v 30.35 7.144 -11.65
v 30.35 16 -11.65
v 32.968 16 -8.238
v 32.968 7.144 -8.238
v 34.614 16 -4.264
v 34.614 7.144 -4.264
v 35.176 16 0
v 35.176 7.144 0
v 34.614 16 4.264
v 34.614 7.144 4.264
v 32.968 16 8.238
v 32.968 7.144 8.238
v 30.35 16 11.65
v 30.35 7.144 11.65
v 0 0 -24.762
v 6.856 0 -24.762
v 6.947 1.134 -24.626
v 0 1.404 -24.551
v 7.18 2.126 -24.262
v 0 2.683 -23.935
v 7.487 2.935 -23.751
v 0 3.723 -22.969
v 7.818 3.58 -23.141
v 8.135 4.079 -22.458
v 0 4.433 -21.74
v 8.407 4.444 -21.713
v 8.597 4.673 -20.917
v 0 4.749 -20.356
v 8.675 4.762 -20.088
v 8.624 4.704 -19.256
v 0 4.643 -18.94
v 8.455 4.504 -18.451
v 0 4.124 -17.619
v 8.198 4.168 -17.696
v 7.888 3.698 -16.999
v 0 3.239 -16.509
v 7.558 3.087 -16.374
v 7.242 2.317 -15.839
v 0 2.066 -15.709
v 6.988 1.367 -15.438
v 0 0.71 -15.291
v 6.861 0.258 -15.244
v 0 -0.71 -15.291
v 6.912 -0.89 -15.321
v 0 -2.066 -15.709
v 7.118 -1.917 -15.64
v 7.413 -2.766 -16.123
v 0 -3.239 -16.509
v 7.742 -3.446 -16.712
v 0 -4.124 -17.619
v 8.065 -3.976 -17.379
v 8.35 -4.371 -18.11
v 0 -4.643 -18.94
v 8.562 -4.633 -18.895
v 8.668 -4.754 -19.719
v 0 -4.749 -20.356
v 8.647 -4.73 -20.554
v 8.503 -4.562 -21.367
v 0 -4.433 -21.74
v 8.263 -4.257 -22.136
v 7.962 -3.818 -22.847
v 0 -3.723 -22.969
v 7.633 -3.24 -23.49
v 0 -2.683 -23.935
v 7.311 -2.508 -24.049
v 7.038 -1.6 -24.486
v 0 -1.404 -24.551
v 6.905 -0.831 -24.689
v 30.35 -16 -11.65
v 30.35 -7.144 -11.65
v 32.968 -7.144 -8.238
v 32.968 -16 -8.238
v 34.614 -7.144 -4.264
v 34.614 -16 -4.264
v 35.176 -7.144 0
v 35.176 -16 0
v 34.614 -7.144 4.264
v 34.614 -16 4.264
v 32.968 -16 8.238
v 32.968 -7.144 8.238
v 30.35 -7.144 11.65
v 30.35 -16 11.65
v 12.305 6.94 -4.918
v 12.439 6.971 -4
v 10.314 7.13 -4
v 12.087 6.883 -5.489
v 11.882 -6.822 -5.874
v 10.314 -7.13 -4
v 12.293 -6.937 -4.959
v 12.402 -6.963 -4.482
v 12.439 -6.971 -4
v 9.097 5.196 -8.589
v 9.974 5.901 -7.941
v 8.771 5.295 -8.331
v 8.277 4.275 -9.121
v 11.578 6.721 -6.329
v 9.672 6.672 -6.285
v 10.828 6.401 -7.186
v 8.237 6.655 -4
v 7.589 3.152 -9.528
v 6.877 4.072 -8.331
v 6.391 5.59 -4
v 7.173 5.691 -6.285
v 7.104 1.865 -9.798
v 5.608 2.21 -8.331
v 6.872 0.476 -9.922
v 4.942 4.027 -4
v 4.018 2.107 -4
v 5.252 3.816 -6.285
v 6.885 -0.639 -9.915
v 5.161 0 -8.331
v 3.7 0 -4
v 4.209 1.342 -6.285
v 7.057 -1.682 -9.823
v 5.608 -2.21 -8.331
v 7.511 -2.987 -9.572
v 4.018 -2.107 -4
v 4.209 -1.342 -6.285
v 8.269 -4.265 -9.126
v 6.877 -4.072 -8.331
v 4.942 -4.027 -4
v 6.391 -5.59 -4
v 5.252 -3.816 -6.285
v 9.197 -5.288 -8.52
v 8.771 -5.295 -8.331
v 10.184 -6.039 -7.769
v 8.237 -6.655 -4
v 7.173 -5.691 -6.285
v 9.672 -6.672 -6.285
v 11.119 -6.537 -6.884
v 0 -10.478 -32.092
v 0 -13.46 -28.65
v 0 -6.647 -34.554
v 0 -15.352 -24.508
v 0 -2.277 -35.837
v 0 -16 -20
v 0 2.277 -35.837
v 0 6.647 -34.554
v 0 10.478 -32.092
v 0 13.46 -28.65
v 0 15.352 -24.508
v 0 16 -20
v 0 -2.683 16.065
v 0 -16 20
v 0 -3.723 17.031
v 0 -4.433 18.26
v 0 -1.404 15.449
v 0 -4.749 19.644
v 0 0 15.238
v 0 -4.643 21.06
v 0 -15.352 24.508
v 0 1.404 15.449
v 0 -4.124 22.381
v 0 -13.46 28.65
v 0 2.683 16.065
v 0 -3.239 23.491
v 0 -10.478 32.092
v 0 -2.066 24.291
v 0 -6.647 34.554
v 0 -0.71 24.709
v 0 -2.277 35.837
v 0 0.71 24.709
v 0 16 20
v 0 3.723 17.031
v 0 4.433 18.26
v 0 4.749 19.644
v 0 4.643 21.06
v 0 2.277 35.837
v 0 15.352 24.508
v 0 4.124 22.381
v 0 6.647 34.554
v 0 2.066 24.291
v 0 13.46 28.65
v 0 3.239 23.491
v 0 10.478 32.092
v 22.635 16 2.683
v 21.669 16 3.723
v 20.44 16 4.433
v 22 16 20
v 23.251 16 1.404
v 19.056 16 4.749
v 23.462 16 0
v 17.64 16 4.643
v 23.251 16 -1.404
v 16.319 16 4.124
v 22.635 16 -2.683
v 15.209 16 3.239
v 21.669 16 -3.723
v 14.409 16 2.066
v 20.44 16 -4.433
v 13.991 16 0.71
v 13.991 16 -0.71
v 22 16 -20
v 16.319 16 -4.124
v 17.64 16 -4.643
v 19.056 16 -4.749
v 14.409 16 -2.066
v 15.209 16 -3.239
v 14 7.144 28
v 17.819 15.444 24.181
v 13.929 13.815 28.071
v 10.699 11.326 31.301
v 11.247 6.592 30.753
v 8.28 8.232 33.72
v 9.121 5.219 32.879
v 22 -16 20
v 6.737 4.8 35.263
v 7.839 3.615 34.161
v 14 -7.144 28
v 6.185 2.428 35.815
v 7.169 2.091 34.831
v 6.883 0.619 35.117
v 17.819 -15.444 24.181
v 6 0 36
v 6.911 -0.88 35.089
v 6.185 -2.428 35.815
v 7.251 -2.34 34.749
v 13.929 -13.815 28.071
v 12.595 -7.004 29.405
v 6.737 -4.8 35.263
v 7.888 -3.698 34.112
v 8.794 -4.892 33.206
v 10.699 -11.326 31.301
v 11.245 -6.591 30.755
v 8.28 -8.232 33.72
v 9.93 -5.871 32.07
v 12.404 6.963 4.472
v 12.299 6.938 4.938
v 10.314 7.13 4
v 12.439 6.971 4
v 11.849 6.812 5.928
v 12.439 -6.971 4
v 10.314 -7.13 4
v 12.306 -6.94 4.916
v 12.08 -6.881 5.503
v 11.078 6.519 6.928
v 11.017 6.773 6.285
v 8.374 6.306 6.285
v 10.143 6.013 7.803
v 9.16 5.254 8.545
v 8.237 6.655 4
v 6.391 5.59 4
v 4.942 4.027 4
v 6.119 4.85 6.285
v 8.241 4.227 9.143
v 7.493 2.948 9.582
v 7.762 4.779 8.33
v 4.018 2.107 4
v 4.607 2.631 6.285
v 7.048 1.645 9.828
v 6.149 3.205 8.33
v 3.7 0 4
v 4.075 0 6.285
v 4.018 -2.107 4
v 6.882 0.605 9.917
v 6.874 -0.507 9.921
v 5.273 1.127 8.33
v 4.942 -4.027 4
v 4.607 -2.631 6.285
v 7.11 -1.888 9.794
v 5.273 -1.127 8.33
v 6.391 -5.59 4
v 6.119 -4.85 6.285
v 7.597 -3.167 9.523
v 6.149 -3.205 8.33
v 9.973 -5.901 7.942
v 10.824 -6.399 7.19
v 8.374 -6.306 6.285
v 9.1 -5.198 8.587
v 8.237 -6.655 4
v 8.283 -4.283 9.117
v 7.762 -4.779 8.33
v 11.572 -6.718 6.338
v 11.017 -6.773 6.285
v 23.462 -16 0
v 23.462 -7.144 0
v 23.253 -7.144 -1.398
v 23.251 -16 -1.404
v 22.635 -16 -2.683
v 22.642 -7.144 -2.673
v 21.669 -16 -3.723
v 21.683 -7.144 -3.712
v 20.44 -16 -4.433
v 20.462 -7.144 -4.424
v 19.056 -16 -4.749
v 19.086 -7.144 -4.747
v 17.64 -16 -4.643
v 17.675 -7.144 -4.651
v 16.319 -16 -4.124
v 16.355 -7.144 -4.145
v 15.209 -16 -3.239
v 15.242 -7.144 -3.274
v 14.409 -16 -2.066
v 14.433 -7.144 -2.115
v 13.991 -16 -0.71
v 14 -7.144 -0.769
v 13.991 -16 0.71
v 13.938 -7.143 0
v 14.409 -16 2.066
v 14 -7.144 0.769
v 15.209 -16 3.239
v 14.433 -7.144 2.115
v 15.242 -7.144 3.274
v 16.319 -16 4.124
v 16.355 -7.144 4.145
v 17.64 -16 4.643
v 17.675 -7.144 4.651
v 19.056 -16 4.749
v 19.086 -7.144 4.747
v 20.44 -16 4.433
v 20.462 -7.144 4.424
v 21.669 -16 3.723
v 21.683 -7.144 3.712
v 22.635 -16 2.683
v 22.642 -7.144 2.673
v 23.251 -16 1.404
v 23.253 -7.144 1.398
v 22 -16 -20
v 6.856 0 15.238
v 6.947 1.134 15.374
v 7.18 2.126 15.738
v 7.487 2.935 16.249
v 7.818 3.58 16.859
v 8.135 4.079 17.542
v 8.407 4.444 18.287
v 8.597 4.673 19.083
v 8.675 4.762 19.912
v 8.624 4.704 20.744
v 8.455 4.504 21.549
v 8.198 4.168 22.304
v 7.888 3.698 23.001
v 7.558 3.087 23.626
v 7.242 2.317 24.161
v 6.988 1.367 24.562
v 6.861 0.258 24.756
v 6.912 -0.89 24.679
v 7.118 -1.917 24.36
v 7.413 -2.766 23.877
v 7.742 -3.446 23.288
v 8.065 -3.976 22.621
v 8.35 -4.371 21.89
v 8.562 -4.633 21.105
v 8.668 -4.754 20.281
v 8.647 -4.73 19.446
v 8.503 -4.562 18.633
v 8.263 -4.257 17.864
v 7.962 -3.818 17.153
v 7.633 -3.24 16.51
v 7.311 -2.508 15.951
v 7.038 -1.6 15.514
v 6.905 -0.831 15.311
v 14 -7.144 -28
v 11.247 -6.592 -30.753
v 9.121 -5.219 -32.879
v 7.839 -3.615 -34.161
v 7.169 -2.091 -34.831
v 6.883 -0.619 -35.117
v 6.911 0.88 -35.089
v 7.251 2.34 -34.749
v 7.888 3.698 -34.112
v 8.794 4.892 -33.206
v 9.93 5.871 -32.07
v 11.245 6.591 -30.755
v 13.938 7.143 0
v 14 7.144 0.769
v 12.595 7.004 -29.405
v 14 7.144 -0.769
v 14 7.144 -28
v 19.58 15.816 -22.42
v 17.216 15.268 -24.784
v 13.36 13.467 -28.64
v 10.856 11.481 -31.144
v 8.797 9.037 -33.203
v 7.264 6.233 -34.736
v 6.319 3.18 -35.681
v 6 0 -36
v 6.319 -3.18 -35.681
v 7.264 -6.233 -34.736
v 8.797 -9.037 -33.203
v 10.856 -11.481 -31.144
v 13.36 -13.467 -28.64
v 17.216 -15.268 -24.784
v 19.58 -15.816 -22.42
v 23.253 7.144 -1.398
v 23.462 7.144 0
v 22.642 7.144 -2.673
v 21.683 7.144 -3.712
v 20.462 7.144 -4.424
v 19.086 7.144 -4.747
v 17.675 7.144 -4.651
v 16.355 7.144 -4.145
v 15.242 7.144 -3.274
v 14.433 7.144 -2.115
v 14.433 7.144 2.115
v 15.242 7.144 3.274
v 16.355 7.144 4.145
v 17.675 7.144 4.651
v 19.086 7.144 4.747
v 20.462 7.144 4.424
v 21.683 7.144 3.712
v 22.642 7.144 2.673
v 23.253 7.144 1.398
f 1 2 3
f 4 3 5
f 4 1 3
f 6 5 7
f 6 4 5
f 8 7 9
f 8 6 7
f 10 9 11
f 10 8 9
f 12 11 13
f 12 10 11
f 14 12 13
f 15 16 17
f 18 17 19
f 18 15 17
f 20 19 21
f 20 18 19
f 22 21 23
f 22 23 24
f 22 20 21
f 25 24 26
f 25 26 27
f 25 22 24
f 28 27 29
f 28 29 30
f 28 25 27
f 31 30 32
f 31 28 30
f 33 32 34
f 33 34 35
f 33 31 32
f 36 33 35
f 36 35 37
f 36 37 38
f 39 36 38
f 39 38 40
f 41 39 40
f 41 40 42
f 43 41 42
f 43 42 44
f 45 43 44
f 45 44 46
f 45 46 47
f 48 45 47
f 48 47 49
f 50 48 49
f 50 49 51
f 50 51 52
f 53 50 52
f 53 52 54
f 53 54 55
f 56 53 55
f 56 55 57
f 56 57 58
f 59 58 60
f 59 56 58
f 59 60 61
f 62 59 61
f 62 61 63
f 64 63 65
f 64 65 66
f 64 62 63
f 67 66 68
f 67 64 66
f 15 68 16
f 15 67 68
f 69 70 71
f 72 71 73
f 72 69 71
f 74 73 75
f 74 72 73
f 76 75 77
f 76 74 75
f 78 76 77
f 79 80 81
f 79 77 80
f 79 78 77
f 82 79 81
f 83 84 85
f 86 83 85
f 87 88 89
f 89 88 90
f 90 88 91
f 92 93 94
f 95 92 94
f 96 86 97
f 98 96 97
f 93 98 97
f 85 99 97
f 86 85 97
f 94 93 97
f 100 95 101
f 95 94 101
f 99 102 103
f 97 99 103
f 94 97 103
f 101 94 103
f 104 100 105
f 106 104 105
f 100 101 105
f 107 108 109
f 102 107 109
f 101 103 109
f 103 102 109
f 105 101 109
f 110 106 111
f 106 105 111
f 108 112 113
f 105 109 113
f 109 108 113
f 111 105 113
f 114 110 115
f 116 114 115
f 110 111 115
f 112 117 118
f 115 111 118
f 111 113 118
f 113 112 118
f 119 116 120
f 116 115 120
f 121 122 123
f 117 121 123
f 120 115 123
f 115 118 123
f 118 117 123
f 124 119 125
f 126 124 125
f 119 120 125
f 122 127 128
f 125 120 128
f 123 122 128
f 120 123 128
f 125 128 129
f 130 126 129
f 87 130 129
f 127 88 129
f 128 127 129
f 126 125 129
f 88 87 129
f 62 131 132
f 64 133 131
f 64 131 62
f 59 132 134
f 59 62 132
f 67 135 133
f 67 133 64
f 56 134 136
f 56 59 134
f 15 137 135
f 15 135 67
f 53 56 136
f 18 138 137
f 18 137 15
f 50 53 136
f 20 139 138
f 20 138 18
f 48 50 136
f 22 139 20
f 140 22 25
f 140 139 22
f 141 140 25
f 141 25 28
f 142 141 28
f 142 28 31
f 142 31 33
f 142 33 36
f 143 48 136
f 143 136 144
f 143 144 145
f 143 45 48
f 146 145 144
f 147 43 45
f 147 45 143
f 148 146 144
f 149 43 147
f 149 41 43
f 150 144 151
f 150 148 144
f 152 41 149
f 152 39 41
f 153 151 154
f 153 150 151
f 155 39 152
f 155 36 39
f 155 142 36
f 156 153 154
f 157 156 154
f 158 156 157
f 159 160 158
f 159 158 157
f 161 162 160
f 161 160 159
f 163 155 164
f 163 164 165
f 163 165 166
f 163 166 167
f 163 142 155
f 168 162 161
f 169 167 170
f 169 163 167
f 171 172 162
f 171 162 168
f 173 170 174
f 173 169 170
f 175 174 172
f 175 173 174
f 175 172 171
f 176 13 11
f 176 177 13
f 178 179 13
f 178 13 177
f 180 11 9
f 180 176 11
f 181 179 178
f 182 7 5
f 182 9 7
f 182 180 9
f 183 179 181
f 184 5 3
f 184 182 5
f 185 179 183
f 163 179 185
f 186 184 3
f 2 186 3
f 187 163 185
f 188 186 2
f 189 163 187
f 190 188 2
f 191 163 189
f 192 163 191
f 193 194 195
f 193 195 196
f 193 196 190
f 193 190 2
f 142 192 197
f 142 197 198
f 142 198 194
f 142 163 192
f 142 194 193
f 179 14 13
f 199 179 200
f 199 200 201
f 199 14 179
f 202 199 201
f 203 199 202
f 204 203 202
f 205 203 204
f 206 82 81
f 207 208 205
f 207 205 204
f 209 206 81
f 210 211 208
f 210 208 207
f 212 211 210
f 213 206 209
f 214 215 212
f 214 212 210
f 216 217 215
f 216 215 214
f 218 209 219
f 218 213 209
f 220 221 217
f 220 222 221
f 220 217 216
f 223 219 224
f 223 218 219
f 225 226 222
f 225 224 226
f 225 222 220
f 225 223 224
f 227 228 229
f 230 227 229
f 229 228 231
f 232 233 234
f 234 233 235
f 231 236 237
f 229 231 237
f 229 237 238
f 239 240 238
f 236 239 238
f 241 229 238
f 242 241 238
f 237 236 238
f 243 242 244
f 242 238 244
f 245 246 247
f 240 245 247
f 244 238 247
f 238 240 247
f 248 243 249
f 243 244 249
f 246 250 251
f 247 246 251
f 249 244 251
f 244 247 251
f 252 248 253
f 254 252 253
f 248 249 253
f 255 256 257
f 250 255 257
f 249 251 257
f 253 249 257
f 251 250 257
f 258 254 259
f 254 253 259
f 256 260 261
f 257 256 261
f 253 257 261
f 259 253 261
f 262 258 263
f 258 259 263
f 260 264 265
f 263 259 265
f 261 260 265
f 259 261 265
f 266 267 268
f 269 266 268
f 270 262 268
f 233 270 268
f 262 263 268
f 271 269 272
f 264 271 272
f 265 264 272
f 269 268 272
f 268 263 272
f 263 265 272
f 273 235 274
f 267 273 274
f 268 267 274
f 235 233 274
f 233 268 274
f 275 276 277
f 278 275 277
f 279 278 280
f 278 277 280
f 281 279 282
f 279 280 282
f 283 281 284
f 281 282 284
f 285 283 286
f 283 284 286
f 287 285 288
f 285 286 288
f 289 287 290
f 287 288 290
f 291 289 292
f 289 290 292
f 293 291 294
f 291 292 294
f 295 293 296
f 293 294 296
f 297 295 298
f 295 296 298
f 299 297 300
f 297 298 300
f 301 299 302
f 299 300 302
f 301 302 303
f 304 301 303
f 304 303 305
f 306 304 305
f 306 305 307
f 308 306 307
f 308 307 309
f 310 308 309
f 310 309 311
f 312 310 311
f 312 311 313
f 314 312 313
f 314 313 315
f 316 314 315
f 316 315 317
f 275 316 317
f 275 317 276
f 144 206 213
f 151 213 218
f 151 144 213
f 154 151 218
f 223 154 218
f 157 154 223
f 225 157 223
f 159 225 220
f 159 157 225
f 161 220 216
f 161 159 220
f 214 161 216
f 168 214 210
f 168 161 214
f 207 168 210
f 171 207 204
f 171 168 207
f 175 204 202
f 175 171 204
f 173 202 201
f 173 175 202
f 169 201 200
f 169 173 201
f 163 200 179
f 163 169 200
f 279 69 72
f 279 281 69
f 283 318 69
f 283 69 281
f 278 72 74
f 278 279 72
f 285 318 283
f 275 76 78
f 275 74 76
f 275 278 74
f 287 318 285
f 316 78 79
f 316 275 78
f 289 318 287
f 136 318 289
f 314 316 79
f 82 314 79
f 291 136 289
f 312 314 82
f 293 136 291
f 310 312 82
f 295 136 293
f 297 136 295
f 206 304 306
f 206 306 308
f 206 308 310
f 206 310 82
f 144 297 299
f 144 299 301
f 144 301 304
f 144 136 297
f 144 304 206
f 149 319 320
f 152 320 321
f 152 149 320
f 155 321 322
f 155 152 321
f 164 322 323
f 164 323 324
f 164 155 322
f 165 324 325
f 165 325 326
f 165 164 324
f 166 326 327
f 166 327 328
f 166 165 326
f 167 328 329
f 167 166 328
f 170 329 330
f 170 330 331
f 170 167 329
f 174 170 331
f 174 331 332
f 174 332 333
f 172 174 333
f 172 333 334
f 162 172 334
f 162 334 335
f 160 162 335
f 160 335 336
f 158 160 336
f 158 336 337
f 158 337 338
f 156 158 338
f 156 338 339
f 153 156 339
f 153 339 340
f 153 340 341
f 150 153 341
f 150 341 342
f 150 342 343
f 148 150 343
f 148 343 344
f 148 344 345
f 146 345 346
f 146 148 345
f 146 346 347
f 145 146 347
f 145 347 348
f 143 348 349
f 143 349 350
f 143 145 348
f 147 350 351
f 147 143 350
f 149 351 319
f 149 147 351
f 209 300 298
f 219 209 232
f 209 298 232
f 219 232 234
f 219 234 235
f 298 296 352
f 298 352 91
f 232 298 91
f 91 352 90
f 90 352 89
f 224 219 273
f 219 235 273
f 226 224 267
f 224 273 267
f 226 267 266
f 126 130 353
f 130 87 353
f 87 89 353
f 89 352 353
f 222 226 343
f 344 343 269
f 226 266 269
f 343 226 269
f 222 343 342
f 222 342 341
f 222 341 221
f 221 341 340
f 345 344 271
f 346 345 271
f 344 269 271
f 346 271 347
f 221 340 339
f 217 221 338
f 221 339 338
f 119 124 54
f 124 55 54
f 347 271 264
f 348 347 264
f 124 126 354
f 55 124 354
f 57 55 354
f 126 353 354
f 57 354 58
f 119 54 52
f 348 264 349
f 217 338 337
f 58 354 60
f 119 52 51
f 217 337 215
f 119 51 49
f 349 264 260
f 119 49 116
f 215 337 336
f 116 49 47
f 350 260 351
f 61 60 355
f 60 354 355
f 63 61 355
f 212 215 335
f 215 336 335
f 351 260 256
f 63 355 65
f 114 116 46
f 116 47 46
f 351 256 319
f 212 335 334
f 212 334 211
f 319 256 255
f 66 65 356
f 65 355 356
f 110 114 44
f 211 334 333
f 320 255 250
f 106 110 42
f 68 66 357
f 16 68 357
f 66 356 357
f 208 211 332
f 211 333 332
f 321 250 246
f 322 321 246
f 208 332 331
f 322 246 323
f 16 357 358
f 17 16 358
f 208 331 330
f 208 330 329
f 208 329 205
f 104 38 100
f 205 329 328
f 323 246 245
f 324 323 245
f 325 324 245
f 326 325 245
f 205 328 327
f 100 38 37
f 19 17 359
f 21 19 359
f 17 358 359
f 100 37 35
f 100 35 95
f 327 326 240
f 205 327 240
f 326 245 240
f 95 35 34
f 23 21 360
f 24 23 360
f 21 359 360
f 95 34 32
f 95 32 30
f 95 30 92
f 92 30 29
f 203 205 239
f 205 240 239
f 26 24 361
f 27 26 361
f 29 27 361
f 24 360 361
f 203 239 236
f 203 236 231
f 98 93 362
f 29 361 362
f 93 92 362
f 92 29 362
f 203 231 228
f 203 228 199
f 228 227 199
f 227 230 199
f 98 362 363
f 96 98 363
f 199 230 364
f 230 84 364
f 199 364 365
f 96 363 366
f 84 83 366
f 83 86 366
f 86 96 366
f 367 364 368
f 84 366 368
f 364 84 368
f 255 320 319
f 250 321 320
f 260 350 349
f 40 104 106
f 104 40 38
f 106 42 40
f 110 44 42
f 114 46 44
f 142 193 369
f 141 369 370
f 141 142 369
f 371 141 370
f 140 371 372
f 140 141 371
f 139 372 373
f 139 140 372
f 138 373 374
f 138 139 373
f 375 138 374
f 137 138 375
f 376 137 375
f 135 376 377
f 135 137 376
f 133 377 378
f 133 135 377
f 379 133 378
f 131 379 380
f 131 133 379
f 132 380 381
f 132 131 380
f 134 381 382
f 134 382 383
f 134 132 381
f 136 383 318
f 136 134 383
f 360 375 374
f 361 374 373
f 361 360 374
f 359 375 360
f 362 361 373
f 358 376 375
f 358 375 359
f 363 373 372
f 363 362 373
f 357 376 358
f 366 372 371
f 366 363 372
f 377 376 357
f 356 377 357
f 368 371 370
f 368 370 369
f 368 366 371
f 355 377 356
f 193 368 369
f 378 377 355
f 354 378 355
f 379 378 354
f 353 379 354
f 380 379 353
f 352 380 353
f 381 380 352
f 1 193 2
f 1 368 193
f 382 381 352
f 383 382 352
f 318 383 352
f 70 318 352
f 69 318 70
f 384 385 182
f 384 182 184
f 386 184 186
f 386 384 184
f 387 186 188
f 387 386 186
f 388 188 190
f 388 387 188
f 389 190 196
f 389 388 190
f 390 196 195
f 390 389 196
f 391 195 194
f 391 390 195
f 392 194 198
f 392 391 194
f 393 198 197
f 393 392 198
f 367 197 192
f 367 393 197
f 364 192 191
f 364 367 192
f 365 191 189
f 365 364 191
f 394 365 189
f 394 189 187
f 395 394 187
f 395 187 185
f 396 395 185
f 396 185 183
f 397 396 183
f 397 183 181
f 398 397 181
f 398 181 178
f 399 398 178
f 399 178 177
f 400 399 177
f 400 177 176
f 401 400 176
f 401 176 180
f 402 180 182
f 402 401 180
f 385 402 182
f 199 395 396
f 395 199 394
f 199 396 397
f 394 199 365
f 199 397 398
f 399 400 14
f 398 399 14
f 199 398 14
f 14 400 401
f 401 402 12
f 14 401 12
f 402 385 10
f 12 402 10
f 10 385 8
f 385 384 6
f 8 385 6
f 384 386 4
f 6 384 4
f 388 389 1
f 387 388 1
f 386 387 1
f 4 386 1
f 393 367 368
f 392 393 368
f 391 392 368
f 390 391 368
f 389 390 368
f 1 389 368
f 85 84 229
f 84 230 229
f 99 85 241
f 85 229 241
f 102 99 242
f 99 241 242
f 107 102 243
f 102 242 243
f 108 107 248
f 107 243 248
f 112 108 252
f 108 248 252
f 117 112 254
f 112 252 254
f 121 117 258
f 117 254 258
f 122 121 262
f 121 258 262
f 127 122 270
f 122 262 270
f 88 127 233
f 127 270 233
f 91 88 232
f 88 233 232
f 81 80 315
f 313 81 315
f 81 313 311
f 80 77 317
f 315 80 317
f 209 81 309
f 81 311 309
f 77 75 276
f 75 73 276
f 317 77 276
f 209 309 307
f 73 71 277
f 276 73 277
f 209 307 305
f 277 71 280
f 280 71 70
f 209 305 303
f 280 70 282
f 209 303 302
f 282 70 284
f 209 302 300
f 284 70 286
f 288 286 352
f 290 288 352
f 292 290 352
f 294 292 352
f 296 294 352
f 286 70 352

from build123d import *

# Parameters (mm, degrees)
SKETCH1_R               = 4.7625
BOSS_EXTRUDE1_DEPTH     = 50
CUT_EXTRUDE3_DEPTH      = 17
CUT_EXTRUDE3_DEPTH_BACK = 17
SKETCH5_R               = 4.7625
CUT_EXTRUDE2_DEPTH      = 17
CUT_EXTRUDE2_DEPTH_BACK = 17
CUT_EXTRUDE4_DEPTH      = 37
CUT_EXTRUDE4_DEPTH_BACK = 37


with BuildPart() as part:
    # Sketch1 → Boss-Extrude1 (new body)
    with BuildSketch(Plane(origin=(0, 0, 0), x_dir=(0, 0, -1), z_dir=(1, 0, 0))):
        with BuildLine():
            Line((-20, 16), (0, 16))
            Line((0, 16), (20, 16))
            ThreePointArc((20, 16), (36, 0), (20, -16))
            Line((20, -16), (0, -16))
            Line((0, -16), (-20, -16))
            ThreePointArc((-20, -16), (-36, 0), (-20, 16))
        make_face()
        with Locations((-20, 0)):
            Circle(SKETCH1_R, mode=Mode.SUBTRACT)
        with Locations((20, 0)):
            Circle(SKETCH1_R, mode=Mode.SUBTRACT)
    extrude(amount=BOSS_EXTRUDE1_DEPTH)

    # Sketch3 → Cut-Extrude3 (cut, two sides)
    with BuildSketch(Plane(origin=(0, 0, 0), x_dir=(1, 0, 0), z_dir=(0, 1, 0))) as cut_extrude3_sk:
        with BuildLine():
            Line((6, 36), (30.35, 11.65))
            ThreePointArc((30.35, 11.65), (35.175588002, 0), (30.35, -11.65))
            Line((30.35, -11.65), (6, -36))
            Line((6, -36), (6, -40.720576269))
            Line((6, -40.720576269), (53.537884165, -40.720576269))
            Line((53.537884165, -40.720576269), (53.537884165, 49.648939658))
            Line((53.537884165, 49.648939658), (6, 49.648939658))
            Line((6, 49.648939658), (6, 36))
        make_face()
    extrude(amount=CUT_EXTRUDE3_DEPTH, mode=Mode.SUBTRACT)
    extrude(cut_extrude3_sk.sketch, amount=-CUT_EXTRUDE3_DEPTH_BACK, mode=Mode.SUBTRACT)

    # Sketch5 → Cut-Extrude2 (cut, two sides)
    with BuildSketch(Plane(origin=(0, 0, 0), x_dir=(1, 0, 0), z_dir=(0, 1, 0))) as cut_extrude2_sk:
        with Locations((18.7, 0)):
            Circle(SKETCH5_R)
    extrude(amount=CUT_EXTRUDE2_DEPTH, mode=Mode.SUBTRACT)
    extrude(cut_extrude2_sk.sketch, amount=-CUT_EXTRUDE2_DEPTH_BACK, mode=Mode.SUBTRACT)

    # Sketch7 → Cut-Extrude4 (cut, two sides)
    with BuildSketch(Plane.XY) as cut_extrude4_sk:
        with BuildLine():
            Line((56.351176003, -7.14375), (14, -7.14375))
            ThreePointArc((14, -7.14375), (6.85625, 0), (14, 7.14375))
            Line((14, 7.14375), (56.351176003, 7.14375))
            ThreePointArc((56.351176003, 7.14375), (63.494926003, 0), (56.351176003, -7.14375))
        make_face()
    extrude(amount=CUT_EXTRUDE4_DEPTH, mode=Mode.SUBTRACT)
    extrude(cut_extrude4_sk.sketch, amount=-CUT_EXTRUDE4_DEPTH_BACK, mode=Mode.SUBTRACT)

    # Sketch10 → Cut-Revolve1 (revolve, cut)
    with BuildSketch(Plane(origin=(0, 0, 0), x_dir=(1, 0, 0), z_dir=(0, 1, 0))):
        with BuildLine():
            Line((3.7, 4), (3.7, -4))
            ThreePointArc((3.7, -4), (5.794186515, -9.055813485), (10.85, -11.15))
            Line((10.85, -11.15), (10.85, 11.15))
            ThreePointArc((10.85, 11.15), (5.794186515, 9.055813485), (3.7, 4))
        make_face()
    revolve(axis=Axis((10.85, 0, -11.15), (0, 0, 1)), mode=Mode.SUBTRACT)


solid = part.part
